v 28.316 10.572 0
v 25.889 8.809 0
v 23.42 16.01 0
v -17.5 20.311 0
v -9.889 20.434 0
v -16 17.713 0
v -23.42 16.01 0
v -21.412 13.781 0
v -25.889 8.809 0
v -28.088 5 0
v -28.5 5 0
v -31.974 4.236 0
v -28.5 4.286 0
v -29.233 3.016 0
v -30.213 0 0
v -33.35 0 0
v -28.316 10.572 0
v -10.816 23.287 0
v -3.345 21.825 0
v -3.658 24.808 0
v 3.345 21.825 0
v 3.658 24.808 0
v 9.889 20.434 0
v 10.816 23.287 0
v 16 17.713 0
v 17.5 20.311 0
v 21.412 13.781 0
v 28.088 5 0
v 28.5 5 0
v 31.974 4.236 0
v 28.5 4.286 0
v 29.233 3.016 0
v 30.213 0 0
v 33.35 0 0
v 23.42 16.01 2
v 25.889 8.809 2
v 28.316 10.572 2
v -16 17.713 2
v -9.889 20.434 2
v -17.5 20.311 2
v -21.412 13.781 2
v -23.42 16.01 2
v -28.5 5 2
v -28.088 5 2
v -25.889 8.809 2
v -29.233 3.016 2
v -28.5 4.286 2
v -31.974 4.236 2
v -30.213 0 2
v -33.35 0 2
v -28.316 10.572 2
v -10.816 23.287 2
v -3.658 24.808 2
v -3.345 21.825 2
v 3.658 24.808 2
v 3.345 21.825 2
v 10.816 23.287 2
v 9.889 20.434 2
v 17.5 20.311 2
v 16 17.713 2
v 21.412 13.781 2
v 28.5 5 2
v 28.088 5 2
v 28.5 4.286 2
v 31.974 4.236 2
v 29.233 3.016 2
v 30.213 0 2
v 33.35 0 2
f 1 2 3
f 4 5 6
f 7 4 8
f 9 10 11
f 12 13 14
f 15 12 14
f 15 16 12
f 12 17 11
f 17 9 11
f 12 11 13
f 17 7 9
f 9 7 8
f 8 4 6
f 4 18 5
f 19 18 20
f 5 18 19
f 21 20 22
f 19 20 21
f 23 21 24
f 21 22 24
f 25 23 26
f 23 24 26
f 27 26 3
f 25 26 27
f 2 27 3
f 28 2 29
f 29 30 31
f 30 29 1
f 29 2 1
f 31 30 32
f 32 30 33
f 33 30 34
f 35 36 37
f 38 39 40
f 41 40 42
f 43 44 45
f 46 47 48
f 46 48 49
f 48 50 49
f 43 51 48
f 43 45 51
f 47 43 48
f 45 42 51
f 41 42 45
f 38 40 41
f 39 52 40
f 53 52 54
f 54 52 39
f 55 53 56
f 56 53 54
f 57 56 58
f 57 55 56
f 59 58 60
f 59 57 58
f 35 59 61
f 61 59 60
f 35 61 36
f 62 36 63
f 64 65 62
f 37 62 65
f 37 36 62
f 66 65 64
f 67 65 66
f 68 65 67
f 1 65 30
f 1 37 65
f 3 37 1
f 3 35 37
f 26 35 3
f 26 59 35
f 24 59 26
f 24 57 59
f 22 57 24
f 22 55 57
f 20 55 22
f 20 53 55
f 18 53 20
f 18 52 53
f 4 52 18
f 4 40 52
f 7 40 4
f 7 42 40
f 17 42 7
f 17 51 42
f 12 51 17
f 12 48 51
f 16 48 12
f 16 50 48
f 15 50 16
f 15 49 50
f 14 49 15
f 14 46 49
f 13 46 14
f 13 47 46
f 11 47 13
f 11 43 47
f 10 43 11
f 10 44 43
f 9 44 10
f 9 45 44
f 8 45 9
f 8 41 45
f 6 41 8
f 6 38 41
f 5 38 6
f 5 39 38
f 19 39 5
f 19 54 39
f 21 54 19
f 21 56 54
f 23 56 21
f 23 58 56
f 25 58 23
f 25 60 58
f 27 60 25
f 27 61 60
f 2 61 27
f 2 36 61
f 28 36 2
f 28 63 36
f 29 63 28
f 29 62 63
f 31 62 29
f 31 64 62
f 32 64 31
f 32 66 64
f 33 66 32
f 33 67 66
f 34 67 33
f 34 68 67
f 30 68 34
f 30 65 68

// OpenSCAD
outer_diameter = 70;

linear_extrude(height = 2) 
difference() {
    translate([0, -10,0]) {
        circle(r = 35);
    }

    translate([0, -10,0]) {
        circle(r = 32);
    } 
    #square([57, 10], center=true);
    #translate([-outer_diameter/2, -outer_diameter,0]) {
        square(size = outer_diameter);
    }
}
